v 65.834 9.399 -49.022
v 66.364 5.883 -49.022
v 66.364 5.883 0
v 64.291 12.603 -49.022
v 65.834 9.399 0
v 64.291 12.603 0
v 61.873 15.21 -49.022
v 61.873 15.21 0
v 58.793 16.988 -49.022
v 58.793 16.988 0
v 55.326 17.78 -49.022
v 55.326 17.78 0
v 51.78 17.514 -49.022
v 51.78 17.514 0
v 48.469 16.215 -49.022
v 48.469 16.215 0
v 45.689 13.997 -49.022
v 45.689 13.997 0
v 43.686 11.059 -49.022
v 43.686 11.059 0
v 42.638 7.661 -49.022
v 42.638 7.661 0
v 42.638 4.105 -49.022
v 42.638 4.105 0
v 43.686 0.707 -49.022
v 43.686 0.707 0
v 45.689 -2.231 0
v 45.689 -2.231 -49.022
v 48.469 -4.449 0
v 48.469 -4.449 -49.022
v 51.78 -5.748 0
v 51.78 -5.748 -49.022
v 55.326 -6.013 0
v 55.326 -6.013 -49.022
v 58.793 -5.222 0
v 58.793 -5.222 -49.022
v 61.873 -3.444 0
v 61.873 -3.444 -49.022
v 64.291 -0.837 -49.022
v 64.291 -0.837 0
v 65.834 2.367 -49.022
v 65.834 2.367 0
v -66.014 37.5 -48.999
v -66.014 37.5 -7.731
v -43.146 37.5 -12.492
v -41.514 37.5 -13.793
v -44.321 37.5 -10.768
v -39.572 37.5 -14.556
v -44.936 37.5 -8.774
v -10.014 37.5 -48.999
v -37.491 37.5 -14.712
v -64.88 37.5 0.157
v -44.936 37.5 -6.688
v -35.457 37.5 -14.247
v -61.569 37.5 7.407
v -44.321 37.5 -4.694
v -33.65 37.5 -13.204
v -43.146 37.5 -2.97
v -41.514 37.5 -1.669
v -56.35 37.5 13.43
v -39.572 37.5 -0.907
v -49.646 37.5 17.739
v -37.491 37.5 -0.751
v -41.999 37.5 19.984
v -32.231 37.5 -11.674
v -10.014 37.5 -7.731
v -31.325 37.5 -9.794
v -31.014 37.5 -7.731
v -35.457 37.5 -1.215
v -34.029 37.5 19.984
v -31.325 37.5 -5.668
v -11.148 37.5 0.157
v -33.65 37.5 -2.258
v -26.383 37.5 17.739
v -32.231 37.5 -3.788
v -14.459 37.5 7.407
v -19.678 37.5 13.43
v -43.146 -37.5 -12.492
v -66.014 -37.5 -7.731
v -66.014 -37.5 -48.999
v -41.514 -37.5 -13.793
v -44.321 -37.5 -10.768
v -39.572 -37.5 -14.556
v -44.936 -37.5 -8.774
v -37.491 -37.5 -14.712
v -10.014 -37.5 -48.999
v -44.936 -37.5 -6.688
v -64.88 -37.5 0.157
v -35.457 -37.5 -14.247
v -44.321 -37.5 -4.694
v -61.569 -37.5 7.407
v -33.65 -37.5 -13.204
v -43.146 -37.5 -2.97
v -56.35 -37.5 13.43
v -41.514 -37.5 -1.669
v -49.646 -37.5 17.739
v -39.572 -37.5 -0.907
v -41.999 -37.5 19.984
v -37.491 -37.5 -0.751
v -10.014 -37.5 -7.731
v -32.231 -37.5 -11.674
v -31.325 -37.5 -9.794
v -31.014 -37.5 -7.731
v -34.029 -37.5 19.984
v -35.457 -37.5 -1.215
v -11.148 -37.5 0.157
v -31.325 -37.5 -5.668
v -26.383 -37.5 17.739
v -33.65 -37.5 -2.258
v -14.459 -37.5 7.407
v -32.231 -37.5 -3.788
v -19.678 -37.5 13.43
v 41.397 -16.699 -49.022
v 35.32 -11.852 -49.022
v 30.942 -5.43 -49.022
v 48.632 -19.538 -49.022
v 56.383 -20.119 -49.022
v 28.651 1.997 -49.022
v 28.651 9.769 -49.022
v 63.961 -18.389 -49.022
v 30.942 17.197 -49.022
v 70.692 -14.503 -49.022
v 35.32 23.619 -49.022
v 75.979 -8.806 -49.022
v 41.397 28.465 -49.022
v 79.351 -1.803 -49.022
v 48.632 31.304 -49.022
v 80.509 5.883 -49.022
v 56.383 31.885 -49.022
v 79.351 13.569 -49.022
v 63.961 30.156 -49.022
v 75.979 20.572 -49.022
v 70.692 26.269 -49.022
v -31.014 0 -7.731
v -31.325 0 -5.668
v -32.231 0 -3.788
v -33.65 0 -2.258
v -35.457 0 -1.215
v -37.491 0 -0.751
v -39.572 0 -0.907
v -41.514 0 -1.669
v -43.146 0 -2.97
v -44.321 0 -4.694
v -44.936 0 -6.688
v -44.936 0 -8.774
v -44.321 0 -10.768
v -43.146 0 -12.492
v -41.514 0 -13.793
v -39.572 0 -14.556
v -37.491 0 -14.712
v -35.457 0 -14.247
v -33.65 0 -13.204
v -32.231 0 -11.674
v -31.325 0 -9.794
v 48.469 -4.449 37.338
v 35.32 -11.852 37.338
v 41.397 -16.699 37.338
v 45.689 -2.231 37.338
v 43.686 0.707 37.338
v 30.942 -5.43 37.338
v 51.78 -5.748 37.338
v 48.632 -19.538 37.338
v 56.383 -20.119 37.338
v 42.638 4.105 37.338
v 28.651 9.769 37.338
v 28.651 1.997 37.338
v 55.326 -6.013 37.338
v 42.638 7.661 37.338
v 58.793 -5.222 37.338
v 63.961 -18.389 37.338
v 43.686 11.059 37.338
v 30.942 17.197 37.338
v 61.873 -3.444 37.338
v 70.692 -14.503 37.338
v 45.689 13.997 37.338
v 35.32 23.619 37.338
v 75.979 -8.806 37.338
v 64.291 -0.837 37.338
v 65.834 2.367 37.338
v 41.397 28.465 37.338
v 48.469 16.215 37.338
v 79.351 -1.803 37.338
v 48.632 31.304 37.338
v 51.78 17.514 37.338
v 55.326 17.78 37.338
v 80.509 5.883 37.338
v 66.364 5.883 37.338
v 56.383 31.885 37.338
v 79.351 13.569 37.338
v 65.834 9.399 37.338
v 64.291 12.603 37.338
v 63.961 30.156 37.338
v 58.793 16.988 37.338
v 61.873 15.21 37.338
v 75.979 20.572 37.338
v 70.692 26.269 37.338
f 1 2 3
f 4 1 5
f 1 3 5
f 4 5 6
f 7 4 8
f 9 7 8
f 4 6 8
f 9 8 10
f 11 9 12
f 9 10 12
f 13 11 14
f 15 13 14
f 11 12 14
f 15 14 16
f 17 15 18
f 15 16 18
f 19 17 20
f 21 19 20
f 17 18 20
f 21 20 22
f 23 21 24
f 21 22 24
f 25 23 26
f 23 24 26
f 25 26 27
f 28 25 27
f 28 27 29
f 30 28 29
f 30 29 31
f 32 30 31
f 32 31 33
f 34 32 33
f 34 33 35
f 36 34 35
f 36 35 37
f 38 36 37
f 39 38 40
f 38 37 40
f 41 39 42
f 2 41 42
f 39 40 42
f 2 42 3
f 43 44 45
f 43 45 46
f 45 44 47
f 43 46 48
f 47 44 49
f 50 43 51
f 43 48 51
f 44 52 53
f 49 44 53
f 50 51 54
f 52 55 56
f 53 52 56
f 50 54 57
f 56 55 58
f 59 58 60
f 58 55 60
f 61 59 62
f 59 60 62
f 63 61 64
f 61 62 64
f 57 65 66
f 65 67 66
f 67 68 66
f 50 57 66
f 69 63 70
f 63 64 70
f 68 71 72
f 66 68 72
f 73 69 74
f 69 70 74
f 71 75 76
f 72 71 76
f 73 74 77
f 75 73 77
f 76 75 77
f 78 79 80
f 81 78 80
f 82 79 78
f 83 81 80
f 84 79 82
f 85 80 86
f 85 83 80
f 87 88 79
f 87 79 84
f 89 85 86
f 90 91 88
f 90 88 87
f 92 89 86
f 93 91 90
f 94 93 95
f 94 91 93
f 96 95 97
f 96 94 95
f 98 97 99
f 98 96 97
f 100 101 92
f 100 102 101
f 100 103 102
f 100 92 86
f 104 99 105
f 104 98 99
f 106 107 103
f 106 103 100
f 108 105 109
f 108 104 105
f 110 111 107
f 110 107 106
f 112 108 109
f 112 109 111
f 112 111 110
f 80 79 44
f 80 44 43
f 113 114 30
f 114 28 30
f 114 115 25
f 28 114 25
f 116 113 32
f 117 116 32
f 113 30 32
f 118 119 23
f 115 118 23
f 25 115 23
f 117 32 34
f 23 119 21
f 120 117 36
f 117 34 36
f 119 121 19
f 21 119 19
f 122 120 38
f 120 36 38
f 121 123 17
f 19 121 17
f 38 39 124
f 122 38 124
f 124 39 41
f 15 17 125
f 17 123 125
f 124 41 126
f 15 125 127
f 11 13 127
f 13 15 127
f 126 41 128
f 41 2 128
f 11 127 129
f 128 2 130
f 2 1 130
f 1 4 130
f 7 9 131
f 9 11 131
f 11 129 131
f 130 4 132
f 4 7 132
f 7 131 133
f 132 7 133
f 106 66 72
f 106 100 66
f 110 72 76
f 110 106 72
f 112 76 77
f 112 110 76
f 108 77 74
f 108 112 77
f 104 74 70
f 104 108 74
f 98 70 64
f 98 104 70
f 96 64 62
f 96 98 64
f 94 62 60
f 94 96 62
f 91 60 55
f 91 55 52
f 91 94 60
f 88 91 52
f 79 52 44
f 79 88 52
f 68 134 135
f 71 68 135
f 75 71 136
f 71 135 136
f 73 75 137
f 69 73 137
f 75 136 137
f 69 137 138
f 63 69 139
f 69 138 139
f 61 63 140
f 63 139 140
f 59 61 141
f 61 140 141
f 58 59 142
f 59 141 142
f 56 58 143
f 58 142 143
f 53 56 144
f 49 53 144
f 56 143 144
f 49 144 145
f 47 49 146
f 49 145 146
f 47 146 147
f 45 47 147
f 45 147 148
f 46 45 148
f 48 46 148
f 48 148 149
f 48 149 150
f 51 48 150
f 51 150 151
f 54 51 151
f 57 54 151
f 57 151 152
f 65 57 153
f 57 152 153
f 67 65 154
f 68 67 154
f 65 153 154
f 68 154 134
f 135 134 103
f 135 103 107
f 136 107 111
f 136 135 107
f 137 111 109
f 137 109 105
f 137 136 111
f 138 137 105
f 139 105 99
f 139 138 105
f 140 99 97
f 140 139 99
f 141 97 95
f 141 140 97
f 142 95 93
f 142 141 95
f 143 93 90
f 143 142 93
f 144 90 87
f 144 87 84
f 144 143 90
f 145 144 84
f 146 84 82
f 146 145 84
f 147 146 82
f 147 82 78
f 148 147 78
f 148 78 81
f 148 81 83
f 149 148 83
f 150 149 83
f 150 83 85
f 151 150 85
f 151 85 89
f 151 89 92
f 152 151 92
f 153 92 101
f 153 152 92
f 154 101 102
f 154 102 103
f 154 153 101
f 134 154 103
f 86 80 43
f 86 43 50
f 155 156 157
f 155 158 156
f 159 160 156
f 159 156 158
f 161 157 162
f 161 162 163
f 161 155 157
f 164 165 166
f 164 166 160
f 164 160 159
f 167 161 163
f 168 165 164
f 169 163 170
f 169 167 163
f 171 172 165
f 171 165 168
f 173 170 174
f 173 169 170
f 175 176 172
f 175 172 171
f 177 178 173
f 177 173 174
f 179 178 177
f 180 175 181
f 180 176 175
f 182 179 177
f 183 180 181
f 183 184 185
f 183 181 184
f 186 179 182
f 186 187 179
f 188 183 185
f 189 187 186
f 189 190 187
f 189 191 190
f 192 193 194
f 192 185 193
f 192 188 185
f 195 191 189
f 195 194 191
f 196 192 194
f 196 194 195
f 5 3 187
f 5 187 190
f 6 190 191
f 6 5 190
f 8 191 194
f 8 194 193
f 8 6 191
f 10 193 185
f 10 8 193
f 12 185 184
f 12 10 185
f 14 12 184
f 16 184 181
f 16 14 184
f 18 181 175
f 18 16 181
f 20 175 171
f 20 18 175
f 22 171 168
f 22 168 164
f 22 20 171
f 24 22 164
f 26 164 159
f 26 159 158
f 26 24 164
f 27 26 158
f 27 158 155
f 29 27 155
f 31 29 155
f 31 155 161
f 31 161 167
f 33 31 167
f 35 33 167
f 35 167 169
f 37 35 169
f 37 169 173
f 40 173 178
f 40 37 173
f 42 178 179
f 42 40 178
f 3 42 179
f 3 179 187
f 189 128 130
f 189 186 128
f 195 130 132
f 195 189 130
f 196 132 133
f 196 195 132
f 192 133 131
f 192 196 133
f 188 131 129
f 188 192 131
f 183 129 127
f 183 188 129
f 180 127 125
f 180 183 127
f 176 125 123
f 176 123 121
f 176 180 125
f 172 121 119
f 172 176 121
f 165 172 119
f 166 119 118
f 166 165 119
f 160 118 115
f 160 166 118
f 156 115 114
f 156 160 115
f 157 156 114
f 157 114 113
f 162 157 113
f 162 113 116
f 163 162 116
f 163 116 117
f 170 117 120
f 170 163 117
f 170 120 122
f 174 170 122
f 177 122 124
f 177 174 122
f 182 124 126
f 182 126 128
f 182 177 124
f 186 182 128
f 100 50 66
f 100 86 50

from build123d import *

# Parameters (mm, degrees)
F0_R          = 7
F1_DEPTH      = 37.5
F1_DEPTH_BACK = 37.5
F2_R          = 26.075054
F2_R_2        = 11.929896
F3_DEPTH      = 37.338
F3_DEPTH_BACK = 49.022


with BuildPart() as f1:
    # F0 (on Front) → F1 (new body, two sides)
    with BuildSketch(Plane.XZ) as f1_sk:
        with BuildLine():
            ThreePointArc((-10.014228, -7.731111), (-38.014228, 20.268889), (-66.014228, -7.731111))
            Line((-66.014228, -7.731111), (-66.014228, -48.998899))
            Line((-66.014228, -48.998899), (-10.014228, -48.998899))
            Line((-10.014228, -48.998899), (-10.014228, -7.731111))
        make_face()
        with Locations((-38.014228, -7.731111)):
            Circle(F0_R, mode=Mode.SUBTRACT)
    extrude(amount=F1_DEPTH)
    extrude(f1_sk.sketch, amount=-F1_DEPTH_BACK)


with BuildPart() as f3:
    # F2 (on Top) → F3 (new body, two sides)
    with BuildSketch(Plane.XY) as f3_sk:
        with Locations((54.434337, 5.883088)):
            Circle(F2_R)
        with Locations((54.434337, 5.883088)):
            Circle(F2_R_2, mode=Mode.SUBTRACT)
    extrude(amount=F3_DEPTH)
    extrude(f3_sk.sketch, amount=-F3_DEPTH_BACK)


solid = Compound([f1.part, f3.part])
